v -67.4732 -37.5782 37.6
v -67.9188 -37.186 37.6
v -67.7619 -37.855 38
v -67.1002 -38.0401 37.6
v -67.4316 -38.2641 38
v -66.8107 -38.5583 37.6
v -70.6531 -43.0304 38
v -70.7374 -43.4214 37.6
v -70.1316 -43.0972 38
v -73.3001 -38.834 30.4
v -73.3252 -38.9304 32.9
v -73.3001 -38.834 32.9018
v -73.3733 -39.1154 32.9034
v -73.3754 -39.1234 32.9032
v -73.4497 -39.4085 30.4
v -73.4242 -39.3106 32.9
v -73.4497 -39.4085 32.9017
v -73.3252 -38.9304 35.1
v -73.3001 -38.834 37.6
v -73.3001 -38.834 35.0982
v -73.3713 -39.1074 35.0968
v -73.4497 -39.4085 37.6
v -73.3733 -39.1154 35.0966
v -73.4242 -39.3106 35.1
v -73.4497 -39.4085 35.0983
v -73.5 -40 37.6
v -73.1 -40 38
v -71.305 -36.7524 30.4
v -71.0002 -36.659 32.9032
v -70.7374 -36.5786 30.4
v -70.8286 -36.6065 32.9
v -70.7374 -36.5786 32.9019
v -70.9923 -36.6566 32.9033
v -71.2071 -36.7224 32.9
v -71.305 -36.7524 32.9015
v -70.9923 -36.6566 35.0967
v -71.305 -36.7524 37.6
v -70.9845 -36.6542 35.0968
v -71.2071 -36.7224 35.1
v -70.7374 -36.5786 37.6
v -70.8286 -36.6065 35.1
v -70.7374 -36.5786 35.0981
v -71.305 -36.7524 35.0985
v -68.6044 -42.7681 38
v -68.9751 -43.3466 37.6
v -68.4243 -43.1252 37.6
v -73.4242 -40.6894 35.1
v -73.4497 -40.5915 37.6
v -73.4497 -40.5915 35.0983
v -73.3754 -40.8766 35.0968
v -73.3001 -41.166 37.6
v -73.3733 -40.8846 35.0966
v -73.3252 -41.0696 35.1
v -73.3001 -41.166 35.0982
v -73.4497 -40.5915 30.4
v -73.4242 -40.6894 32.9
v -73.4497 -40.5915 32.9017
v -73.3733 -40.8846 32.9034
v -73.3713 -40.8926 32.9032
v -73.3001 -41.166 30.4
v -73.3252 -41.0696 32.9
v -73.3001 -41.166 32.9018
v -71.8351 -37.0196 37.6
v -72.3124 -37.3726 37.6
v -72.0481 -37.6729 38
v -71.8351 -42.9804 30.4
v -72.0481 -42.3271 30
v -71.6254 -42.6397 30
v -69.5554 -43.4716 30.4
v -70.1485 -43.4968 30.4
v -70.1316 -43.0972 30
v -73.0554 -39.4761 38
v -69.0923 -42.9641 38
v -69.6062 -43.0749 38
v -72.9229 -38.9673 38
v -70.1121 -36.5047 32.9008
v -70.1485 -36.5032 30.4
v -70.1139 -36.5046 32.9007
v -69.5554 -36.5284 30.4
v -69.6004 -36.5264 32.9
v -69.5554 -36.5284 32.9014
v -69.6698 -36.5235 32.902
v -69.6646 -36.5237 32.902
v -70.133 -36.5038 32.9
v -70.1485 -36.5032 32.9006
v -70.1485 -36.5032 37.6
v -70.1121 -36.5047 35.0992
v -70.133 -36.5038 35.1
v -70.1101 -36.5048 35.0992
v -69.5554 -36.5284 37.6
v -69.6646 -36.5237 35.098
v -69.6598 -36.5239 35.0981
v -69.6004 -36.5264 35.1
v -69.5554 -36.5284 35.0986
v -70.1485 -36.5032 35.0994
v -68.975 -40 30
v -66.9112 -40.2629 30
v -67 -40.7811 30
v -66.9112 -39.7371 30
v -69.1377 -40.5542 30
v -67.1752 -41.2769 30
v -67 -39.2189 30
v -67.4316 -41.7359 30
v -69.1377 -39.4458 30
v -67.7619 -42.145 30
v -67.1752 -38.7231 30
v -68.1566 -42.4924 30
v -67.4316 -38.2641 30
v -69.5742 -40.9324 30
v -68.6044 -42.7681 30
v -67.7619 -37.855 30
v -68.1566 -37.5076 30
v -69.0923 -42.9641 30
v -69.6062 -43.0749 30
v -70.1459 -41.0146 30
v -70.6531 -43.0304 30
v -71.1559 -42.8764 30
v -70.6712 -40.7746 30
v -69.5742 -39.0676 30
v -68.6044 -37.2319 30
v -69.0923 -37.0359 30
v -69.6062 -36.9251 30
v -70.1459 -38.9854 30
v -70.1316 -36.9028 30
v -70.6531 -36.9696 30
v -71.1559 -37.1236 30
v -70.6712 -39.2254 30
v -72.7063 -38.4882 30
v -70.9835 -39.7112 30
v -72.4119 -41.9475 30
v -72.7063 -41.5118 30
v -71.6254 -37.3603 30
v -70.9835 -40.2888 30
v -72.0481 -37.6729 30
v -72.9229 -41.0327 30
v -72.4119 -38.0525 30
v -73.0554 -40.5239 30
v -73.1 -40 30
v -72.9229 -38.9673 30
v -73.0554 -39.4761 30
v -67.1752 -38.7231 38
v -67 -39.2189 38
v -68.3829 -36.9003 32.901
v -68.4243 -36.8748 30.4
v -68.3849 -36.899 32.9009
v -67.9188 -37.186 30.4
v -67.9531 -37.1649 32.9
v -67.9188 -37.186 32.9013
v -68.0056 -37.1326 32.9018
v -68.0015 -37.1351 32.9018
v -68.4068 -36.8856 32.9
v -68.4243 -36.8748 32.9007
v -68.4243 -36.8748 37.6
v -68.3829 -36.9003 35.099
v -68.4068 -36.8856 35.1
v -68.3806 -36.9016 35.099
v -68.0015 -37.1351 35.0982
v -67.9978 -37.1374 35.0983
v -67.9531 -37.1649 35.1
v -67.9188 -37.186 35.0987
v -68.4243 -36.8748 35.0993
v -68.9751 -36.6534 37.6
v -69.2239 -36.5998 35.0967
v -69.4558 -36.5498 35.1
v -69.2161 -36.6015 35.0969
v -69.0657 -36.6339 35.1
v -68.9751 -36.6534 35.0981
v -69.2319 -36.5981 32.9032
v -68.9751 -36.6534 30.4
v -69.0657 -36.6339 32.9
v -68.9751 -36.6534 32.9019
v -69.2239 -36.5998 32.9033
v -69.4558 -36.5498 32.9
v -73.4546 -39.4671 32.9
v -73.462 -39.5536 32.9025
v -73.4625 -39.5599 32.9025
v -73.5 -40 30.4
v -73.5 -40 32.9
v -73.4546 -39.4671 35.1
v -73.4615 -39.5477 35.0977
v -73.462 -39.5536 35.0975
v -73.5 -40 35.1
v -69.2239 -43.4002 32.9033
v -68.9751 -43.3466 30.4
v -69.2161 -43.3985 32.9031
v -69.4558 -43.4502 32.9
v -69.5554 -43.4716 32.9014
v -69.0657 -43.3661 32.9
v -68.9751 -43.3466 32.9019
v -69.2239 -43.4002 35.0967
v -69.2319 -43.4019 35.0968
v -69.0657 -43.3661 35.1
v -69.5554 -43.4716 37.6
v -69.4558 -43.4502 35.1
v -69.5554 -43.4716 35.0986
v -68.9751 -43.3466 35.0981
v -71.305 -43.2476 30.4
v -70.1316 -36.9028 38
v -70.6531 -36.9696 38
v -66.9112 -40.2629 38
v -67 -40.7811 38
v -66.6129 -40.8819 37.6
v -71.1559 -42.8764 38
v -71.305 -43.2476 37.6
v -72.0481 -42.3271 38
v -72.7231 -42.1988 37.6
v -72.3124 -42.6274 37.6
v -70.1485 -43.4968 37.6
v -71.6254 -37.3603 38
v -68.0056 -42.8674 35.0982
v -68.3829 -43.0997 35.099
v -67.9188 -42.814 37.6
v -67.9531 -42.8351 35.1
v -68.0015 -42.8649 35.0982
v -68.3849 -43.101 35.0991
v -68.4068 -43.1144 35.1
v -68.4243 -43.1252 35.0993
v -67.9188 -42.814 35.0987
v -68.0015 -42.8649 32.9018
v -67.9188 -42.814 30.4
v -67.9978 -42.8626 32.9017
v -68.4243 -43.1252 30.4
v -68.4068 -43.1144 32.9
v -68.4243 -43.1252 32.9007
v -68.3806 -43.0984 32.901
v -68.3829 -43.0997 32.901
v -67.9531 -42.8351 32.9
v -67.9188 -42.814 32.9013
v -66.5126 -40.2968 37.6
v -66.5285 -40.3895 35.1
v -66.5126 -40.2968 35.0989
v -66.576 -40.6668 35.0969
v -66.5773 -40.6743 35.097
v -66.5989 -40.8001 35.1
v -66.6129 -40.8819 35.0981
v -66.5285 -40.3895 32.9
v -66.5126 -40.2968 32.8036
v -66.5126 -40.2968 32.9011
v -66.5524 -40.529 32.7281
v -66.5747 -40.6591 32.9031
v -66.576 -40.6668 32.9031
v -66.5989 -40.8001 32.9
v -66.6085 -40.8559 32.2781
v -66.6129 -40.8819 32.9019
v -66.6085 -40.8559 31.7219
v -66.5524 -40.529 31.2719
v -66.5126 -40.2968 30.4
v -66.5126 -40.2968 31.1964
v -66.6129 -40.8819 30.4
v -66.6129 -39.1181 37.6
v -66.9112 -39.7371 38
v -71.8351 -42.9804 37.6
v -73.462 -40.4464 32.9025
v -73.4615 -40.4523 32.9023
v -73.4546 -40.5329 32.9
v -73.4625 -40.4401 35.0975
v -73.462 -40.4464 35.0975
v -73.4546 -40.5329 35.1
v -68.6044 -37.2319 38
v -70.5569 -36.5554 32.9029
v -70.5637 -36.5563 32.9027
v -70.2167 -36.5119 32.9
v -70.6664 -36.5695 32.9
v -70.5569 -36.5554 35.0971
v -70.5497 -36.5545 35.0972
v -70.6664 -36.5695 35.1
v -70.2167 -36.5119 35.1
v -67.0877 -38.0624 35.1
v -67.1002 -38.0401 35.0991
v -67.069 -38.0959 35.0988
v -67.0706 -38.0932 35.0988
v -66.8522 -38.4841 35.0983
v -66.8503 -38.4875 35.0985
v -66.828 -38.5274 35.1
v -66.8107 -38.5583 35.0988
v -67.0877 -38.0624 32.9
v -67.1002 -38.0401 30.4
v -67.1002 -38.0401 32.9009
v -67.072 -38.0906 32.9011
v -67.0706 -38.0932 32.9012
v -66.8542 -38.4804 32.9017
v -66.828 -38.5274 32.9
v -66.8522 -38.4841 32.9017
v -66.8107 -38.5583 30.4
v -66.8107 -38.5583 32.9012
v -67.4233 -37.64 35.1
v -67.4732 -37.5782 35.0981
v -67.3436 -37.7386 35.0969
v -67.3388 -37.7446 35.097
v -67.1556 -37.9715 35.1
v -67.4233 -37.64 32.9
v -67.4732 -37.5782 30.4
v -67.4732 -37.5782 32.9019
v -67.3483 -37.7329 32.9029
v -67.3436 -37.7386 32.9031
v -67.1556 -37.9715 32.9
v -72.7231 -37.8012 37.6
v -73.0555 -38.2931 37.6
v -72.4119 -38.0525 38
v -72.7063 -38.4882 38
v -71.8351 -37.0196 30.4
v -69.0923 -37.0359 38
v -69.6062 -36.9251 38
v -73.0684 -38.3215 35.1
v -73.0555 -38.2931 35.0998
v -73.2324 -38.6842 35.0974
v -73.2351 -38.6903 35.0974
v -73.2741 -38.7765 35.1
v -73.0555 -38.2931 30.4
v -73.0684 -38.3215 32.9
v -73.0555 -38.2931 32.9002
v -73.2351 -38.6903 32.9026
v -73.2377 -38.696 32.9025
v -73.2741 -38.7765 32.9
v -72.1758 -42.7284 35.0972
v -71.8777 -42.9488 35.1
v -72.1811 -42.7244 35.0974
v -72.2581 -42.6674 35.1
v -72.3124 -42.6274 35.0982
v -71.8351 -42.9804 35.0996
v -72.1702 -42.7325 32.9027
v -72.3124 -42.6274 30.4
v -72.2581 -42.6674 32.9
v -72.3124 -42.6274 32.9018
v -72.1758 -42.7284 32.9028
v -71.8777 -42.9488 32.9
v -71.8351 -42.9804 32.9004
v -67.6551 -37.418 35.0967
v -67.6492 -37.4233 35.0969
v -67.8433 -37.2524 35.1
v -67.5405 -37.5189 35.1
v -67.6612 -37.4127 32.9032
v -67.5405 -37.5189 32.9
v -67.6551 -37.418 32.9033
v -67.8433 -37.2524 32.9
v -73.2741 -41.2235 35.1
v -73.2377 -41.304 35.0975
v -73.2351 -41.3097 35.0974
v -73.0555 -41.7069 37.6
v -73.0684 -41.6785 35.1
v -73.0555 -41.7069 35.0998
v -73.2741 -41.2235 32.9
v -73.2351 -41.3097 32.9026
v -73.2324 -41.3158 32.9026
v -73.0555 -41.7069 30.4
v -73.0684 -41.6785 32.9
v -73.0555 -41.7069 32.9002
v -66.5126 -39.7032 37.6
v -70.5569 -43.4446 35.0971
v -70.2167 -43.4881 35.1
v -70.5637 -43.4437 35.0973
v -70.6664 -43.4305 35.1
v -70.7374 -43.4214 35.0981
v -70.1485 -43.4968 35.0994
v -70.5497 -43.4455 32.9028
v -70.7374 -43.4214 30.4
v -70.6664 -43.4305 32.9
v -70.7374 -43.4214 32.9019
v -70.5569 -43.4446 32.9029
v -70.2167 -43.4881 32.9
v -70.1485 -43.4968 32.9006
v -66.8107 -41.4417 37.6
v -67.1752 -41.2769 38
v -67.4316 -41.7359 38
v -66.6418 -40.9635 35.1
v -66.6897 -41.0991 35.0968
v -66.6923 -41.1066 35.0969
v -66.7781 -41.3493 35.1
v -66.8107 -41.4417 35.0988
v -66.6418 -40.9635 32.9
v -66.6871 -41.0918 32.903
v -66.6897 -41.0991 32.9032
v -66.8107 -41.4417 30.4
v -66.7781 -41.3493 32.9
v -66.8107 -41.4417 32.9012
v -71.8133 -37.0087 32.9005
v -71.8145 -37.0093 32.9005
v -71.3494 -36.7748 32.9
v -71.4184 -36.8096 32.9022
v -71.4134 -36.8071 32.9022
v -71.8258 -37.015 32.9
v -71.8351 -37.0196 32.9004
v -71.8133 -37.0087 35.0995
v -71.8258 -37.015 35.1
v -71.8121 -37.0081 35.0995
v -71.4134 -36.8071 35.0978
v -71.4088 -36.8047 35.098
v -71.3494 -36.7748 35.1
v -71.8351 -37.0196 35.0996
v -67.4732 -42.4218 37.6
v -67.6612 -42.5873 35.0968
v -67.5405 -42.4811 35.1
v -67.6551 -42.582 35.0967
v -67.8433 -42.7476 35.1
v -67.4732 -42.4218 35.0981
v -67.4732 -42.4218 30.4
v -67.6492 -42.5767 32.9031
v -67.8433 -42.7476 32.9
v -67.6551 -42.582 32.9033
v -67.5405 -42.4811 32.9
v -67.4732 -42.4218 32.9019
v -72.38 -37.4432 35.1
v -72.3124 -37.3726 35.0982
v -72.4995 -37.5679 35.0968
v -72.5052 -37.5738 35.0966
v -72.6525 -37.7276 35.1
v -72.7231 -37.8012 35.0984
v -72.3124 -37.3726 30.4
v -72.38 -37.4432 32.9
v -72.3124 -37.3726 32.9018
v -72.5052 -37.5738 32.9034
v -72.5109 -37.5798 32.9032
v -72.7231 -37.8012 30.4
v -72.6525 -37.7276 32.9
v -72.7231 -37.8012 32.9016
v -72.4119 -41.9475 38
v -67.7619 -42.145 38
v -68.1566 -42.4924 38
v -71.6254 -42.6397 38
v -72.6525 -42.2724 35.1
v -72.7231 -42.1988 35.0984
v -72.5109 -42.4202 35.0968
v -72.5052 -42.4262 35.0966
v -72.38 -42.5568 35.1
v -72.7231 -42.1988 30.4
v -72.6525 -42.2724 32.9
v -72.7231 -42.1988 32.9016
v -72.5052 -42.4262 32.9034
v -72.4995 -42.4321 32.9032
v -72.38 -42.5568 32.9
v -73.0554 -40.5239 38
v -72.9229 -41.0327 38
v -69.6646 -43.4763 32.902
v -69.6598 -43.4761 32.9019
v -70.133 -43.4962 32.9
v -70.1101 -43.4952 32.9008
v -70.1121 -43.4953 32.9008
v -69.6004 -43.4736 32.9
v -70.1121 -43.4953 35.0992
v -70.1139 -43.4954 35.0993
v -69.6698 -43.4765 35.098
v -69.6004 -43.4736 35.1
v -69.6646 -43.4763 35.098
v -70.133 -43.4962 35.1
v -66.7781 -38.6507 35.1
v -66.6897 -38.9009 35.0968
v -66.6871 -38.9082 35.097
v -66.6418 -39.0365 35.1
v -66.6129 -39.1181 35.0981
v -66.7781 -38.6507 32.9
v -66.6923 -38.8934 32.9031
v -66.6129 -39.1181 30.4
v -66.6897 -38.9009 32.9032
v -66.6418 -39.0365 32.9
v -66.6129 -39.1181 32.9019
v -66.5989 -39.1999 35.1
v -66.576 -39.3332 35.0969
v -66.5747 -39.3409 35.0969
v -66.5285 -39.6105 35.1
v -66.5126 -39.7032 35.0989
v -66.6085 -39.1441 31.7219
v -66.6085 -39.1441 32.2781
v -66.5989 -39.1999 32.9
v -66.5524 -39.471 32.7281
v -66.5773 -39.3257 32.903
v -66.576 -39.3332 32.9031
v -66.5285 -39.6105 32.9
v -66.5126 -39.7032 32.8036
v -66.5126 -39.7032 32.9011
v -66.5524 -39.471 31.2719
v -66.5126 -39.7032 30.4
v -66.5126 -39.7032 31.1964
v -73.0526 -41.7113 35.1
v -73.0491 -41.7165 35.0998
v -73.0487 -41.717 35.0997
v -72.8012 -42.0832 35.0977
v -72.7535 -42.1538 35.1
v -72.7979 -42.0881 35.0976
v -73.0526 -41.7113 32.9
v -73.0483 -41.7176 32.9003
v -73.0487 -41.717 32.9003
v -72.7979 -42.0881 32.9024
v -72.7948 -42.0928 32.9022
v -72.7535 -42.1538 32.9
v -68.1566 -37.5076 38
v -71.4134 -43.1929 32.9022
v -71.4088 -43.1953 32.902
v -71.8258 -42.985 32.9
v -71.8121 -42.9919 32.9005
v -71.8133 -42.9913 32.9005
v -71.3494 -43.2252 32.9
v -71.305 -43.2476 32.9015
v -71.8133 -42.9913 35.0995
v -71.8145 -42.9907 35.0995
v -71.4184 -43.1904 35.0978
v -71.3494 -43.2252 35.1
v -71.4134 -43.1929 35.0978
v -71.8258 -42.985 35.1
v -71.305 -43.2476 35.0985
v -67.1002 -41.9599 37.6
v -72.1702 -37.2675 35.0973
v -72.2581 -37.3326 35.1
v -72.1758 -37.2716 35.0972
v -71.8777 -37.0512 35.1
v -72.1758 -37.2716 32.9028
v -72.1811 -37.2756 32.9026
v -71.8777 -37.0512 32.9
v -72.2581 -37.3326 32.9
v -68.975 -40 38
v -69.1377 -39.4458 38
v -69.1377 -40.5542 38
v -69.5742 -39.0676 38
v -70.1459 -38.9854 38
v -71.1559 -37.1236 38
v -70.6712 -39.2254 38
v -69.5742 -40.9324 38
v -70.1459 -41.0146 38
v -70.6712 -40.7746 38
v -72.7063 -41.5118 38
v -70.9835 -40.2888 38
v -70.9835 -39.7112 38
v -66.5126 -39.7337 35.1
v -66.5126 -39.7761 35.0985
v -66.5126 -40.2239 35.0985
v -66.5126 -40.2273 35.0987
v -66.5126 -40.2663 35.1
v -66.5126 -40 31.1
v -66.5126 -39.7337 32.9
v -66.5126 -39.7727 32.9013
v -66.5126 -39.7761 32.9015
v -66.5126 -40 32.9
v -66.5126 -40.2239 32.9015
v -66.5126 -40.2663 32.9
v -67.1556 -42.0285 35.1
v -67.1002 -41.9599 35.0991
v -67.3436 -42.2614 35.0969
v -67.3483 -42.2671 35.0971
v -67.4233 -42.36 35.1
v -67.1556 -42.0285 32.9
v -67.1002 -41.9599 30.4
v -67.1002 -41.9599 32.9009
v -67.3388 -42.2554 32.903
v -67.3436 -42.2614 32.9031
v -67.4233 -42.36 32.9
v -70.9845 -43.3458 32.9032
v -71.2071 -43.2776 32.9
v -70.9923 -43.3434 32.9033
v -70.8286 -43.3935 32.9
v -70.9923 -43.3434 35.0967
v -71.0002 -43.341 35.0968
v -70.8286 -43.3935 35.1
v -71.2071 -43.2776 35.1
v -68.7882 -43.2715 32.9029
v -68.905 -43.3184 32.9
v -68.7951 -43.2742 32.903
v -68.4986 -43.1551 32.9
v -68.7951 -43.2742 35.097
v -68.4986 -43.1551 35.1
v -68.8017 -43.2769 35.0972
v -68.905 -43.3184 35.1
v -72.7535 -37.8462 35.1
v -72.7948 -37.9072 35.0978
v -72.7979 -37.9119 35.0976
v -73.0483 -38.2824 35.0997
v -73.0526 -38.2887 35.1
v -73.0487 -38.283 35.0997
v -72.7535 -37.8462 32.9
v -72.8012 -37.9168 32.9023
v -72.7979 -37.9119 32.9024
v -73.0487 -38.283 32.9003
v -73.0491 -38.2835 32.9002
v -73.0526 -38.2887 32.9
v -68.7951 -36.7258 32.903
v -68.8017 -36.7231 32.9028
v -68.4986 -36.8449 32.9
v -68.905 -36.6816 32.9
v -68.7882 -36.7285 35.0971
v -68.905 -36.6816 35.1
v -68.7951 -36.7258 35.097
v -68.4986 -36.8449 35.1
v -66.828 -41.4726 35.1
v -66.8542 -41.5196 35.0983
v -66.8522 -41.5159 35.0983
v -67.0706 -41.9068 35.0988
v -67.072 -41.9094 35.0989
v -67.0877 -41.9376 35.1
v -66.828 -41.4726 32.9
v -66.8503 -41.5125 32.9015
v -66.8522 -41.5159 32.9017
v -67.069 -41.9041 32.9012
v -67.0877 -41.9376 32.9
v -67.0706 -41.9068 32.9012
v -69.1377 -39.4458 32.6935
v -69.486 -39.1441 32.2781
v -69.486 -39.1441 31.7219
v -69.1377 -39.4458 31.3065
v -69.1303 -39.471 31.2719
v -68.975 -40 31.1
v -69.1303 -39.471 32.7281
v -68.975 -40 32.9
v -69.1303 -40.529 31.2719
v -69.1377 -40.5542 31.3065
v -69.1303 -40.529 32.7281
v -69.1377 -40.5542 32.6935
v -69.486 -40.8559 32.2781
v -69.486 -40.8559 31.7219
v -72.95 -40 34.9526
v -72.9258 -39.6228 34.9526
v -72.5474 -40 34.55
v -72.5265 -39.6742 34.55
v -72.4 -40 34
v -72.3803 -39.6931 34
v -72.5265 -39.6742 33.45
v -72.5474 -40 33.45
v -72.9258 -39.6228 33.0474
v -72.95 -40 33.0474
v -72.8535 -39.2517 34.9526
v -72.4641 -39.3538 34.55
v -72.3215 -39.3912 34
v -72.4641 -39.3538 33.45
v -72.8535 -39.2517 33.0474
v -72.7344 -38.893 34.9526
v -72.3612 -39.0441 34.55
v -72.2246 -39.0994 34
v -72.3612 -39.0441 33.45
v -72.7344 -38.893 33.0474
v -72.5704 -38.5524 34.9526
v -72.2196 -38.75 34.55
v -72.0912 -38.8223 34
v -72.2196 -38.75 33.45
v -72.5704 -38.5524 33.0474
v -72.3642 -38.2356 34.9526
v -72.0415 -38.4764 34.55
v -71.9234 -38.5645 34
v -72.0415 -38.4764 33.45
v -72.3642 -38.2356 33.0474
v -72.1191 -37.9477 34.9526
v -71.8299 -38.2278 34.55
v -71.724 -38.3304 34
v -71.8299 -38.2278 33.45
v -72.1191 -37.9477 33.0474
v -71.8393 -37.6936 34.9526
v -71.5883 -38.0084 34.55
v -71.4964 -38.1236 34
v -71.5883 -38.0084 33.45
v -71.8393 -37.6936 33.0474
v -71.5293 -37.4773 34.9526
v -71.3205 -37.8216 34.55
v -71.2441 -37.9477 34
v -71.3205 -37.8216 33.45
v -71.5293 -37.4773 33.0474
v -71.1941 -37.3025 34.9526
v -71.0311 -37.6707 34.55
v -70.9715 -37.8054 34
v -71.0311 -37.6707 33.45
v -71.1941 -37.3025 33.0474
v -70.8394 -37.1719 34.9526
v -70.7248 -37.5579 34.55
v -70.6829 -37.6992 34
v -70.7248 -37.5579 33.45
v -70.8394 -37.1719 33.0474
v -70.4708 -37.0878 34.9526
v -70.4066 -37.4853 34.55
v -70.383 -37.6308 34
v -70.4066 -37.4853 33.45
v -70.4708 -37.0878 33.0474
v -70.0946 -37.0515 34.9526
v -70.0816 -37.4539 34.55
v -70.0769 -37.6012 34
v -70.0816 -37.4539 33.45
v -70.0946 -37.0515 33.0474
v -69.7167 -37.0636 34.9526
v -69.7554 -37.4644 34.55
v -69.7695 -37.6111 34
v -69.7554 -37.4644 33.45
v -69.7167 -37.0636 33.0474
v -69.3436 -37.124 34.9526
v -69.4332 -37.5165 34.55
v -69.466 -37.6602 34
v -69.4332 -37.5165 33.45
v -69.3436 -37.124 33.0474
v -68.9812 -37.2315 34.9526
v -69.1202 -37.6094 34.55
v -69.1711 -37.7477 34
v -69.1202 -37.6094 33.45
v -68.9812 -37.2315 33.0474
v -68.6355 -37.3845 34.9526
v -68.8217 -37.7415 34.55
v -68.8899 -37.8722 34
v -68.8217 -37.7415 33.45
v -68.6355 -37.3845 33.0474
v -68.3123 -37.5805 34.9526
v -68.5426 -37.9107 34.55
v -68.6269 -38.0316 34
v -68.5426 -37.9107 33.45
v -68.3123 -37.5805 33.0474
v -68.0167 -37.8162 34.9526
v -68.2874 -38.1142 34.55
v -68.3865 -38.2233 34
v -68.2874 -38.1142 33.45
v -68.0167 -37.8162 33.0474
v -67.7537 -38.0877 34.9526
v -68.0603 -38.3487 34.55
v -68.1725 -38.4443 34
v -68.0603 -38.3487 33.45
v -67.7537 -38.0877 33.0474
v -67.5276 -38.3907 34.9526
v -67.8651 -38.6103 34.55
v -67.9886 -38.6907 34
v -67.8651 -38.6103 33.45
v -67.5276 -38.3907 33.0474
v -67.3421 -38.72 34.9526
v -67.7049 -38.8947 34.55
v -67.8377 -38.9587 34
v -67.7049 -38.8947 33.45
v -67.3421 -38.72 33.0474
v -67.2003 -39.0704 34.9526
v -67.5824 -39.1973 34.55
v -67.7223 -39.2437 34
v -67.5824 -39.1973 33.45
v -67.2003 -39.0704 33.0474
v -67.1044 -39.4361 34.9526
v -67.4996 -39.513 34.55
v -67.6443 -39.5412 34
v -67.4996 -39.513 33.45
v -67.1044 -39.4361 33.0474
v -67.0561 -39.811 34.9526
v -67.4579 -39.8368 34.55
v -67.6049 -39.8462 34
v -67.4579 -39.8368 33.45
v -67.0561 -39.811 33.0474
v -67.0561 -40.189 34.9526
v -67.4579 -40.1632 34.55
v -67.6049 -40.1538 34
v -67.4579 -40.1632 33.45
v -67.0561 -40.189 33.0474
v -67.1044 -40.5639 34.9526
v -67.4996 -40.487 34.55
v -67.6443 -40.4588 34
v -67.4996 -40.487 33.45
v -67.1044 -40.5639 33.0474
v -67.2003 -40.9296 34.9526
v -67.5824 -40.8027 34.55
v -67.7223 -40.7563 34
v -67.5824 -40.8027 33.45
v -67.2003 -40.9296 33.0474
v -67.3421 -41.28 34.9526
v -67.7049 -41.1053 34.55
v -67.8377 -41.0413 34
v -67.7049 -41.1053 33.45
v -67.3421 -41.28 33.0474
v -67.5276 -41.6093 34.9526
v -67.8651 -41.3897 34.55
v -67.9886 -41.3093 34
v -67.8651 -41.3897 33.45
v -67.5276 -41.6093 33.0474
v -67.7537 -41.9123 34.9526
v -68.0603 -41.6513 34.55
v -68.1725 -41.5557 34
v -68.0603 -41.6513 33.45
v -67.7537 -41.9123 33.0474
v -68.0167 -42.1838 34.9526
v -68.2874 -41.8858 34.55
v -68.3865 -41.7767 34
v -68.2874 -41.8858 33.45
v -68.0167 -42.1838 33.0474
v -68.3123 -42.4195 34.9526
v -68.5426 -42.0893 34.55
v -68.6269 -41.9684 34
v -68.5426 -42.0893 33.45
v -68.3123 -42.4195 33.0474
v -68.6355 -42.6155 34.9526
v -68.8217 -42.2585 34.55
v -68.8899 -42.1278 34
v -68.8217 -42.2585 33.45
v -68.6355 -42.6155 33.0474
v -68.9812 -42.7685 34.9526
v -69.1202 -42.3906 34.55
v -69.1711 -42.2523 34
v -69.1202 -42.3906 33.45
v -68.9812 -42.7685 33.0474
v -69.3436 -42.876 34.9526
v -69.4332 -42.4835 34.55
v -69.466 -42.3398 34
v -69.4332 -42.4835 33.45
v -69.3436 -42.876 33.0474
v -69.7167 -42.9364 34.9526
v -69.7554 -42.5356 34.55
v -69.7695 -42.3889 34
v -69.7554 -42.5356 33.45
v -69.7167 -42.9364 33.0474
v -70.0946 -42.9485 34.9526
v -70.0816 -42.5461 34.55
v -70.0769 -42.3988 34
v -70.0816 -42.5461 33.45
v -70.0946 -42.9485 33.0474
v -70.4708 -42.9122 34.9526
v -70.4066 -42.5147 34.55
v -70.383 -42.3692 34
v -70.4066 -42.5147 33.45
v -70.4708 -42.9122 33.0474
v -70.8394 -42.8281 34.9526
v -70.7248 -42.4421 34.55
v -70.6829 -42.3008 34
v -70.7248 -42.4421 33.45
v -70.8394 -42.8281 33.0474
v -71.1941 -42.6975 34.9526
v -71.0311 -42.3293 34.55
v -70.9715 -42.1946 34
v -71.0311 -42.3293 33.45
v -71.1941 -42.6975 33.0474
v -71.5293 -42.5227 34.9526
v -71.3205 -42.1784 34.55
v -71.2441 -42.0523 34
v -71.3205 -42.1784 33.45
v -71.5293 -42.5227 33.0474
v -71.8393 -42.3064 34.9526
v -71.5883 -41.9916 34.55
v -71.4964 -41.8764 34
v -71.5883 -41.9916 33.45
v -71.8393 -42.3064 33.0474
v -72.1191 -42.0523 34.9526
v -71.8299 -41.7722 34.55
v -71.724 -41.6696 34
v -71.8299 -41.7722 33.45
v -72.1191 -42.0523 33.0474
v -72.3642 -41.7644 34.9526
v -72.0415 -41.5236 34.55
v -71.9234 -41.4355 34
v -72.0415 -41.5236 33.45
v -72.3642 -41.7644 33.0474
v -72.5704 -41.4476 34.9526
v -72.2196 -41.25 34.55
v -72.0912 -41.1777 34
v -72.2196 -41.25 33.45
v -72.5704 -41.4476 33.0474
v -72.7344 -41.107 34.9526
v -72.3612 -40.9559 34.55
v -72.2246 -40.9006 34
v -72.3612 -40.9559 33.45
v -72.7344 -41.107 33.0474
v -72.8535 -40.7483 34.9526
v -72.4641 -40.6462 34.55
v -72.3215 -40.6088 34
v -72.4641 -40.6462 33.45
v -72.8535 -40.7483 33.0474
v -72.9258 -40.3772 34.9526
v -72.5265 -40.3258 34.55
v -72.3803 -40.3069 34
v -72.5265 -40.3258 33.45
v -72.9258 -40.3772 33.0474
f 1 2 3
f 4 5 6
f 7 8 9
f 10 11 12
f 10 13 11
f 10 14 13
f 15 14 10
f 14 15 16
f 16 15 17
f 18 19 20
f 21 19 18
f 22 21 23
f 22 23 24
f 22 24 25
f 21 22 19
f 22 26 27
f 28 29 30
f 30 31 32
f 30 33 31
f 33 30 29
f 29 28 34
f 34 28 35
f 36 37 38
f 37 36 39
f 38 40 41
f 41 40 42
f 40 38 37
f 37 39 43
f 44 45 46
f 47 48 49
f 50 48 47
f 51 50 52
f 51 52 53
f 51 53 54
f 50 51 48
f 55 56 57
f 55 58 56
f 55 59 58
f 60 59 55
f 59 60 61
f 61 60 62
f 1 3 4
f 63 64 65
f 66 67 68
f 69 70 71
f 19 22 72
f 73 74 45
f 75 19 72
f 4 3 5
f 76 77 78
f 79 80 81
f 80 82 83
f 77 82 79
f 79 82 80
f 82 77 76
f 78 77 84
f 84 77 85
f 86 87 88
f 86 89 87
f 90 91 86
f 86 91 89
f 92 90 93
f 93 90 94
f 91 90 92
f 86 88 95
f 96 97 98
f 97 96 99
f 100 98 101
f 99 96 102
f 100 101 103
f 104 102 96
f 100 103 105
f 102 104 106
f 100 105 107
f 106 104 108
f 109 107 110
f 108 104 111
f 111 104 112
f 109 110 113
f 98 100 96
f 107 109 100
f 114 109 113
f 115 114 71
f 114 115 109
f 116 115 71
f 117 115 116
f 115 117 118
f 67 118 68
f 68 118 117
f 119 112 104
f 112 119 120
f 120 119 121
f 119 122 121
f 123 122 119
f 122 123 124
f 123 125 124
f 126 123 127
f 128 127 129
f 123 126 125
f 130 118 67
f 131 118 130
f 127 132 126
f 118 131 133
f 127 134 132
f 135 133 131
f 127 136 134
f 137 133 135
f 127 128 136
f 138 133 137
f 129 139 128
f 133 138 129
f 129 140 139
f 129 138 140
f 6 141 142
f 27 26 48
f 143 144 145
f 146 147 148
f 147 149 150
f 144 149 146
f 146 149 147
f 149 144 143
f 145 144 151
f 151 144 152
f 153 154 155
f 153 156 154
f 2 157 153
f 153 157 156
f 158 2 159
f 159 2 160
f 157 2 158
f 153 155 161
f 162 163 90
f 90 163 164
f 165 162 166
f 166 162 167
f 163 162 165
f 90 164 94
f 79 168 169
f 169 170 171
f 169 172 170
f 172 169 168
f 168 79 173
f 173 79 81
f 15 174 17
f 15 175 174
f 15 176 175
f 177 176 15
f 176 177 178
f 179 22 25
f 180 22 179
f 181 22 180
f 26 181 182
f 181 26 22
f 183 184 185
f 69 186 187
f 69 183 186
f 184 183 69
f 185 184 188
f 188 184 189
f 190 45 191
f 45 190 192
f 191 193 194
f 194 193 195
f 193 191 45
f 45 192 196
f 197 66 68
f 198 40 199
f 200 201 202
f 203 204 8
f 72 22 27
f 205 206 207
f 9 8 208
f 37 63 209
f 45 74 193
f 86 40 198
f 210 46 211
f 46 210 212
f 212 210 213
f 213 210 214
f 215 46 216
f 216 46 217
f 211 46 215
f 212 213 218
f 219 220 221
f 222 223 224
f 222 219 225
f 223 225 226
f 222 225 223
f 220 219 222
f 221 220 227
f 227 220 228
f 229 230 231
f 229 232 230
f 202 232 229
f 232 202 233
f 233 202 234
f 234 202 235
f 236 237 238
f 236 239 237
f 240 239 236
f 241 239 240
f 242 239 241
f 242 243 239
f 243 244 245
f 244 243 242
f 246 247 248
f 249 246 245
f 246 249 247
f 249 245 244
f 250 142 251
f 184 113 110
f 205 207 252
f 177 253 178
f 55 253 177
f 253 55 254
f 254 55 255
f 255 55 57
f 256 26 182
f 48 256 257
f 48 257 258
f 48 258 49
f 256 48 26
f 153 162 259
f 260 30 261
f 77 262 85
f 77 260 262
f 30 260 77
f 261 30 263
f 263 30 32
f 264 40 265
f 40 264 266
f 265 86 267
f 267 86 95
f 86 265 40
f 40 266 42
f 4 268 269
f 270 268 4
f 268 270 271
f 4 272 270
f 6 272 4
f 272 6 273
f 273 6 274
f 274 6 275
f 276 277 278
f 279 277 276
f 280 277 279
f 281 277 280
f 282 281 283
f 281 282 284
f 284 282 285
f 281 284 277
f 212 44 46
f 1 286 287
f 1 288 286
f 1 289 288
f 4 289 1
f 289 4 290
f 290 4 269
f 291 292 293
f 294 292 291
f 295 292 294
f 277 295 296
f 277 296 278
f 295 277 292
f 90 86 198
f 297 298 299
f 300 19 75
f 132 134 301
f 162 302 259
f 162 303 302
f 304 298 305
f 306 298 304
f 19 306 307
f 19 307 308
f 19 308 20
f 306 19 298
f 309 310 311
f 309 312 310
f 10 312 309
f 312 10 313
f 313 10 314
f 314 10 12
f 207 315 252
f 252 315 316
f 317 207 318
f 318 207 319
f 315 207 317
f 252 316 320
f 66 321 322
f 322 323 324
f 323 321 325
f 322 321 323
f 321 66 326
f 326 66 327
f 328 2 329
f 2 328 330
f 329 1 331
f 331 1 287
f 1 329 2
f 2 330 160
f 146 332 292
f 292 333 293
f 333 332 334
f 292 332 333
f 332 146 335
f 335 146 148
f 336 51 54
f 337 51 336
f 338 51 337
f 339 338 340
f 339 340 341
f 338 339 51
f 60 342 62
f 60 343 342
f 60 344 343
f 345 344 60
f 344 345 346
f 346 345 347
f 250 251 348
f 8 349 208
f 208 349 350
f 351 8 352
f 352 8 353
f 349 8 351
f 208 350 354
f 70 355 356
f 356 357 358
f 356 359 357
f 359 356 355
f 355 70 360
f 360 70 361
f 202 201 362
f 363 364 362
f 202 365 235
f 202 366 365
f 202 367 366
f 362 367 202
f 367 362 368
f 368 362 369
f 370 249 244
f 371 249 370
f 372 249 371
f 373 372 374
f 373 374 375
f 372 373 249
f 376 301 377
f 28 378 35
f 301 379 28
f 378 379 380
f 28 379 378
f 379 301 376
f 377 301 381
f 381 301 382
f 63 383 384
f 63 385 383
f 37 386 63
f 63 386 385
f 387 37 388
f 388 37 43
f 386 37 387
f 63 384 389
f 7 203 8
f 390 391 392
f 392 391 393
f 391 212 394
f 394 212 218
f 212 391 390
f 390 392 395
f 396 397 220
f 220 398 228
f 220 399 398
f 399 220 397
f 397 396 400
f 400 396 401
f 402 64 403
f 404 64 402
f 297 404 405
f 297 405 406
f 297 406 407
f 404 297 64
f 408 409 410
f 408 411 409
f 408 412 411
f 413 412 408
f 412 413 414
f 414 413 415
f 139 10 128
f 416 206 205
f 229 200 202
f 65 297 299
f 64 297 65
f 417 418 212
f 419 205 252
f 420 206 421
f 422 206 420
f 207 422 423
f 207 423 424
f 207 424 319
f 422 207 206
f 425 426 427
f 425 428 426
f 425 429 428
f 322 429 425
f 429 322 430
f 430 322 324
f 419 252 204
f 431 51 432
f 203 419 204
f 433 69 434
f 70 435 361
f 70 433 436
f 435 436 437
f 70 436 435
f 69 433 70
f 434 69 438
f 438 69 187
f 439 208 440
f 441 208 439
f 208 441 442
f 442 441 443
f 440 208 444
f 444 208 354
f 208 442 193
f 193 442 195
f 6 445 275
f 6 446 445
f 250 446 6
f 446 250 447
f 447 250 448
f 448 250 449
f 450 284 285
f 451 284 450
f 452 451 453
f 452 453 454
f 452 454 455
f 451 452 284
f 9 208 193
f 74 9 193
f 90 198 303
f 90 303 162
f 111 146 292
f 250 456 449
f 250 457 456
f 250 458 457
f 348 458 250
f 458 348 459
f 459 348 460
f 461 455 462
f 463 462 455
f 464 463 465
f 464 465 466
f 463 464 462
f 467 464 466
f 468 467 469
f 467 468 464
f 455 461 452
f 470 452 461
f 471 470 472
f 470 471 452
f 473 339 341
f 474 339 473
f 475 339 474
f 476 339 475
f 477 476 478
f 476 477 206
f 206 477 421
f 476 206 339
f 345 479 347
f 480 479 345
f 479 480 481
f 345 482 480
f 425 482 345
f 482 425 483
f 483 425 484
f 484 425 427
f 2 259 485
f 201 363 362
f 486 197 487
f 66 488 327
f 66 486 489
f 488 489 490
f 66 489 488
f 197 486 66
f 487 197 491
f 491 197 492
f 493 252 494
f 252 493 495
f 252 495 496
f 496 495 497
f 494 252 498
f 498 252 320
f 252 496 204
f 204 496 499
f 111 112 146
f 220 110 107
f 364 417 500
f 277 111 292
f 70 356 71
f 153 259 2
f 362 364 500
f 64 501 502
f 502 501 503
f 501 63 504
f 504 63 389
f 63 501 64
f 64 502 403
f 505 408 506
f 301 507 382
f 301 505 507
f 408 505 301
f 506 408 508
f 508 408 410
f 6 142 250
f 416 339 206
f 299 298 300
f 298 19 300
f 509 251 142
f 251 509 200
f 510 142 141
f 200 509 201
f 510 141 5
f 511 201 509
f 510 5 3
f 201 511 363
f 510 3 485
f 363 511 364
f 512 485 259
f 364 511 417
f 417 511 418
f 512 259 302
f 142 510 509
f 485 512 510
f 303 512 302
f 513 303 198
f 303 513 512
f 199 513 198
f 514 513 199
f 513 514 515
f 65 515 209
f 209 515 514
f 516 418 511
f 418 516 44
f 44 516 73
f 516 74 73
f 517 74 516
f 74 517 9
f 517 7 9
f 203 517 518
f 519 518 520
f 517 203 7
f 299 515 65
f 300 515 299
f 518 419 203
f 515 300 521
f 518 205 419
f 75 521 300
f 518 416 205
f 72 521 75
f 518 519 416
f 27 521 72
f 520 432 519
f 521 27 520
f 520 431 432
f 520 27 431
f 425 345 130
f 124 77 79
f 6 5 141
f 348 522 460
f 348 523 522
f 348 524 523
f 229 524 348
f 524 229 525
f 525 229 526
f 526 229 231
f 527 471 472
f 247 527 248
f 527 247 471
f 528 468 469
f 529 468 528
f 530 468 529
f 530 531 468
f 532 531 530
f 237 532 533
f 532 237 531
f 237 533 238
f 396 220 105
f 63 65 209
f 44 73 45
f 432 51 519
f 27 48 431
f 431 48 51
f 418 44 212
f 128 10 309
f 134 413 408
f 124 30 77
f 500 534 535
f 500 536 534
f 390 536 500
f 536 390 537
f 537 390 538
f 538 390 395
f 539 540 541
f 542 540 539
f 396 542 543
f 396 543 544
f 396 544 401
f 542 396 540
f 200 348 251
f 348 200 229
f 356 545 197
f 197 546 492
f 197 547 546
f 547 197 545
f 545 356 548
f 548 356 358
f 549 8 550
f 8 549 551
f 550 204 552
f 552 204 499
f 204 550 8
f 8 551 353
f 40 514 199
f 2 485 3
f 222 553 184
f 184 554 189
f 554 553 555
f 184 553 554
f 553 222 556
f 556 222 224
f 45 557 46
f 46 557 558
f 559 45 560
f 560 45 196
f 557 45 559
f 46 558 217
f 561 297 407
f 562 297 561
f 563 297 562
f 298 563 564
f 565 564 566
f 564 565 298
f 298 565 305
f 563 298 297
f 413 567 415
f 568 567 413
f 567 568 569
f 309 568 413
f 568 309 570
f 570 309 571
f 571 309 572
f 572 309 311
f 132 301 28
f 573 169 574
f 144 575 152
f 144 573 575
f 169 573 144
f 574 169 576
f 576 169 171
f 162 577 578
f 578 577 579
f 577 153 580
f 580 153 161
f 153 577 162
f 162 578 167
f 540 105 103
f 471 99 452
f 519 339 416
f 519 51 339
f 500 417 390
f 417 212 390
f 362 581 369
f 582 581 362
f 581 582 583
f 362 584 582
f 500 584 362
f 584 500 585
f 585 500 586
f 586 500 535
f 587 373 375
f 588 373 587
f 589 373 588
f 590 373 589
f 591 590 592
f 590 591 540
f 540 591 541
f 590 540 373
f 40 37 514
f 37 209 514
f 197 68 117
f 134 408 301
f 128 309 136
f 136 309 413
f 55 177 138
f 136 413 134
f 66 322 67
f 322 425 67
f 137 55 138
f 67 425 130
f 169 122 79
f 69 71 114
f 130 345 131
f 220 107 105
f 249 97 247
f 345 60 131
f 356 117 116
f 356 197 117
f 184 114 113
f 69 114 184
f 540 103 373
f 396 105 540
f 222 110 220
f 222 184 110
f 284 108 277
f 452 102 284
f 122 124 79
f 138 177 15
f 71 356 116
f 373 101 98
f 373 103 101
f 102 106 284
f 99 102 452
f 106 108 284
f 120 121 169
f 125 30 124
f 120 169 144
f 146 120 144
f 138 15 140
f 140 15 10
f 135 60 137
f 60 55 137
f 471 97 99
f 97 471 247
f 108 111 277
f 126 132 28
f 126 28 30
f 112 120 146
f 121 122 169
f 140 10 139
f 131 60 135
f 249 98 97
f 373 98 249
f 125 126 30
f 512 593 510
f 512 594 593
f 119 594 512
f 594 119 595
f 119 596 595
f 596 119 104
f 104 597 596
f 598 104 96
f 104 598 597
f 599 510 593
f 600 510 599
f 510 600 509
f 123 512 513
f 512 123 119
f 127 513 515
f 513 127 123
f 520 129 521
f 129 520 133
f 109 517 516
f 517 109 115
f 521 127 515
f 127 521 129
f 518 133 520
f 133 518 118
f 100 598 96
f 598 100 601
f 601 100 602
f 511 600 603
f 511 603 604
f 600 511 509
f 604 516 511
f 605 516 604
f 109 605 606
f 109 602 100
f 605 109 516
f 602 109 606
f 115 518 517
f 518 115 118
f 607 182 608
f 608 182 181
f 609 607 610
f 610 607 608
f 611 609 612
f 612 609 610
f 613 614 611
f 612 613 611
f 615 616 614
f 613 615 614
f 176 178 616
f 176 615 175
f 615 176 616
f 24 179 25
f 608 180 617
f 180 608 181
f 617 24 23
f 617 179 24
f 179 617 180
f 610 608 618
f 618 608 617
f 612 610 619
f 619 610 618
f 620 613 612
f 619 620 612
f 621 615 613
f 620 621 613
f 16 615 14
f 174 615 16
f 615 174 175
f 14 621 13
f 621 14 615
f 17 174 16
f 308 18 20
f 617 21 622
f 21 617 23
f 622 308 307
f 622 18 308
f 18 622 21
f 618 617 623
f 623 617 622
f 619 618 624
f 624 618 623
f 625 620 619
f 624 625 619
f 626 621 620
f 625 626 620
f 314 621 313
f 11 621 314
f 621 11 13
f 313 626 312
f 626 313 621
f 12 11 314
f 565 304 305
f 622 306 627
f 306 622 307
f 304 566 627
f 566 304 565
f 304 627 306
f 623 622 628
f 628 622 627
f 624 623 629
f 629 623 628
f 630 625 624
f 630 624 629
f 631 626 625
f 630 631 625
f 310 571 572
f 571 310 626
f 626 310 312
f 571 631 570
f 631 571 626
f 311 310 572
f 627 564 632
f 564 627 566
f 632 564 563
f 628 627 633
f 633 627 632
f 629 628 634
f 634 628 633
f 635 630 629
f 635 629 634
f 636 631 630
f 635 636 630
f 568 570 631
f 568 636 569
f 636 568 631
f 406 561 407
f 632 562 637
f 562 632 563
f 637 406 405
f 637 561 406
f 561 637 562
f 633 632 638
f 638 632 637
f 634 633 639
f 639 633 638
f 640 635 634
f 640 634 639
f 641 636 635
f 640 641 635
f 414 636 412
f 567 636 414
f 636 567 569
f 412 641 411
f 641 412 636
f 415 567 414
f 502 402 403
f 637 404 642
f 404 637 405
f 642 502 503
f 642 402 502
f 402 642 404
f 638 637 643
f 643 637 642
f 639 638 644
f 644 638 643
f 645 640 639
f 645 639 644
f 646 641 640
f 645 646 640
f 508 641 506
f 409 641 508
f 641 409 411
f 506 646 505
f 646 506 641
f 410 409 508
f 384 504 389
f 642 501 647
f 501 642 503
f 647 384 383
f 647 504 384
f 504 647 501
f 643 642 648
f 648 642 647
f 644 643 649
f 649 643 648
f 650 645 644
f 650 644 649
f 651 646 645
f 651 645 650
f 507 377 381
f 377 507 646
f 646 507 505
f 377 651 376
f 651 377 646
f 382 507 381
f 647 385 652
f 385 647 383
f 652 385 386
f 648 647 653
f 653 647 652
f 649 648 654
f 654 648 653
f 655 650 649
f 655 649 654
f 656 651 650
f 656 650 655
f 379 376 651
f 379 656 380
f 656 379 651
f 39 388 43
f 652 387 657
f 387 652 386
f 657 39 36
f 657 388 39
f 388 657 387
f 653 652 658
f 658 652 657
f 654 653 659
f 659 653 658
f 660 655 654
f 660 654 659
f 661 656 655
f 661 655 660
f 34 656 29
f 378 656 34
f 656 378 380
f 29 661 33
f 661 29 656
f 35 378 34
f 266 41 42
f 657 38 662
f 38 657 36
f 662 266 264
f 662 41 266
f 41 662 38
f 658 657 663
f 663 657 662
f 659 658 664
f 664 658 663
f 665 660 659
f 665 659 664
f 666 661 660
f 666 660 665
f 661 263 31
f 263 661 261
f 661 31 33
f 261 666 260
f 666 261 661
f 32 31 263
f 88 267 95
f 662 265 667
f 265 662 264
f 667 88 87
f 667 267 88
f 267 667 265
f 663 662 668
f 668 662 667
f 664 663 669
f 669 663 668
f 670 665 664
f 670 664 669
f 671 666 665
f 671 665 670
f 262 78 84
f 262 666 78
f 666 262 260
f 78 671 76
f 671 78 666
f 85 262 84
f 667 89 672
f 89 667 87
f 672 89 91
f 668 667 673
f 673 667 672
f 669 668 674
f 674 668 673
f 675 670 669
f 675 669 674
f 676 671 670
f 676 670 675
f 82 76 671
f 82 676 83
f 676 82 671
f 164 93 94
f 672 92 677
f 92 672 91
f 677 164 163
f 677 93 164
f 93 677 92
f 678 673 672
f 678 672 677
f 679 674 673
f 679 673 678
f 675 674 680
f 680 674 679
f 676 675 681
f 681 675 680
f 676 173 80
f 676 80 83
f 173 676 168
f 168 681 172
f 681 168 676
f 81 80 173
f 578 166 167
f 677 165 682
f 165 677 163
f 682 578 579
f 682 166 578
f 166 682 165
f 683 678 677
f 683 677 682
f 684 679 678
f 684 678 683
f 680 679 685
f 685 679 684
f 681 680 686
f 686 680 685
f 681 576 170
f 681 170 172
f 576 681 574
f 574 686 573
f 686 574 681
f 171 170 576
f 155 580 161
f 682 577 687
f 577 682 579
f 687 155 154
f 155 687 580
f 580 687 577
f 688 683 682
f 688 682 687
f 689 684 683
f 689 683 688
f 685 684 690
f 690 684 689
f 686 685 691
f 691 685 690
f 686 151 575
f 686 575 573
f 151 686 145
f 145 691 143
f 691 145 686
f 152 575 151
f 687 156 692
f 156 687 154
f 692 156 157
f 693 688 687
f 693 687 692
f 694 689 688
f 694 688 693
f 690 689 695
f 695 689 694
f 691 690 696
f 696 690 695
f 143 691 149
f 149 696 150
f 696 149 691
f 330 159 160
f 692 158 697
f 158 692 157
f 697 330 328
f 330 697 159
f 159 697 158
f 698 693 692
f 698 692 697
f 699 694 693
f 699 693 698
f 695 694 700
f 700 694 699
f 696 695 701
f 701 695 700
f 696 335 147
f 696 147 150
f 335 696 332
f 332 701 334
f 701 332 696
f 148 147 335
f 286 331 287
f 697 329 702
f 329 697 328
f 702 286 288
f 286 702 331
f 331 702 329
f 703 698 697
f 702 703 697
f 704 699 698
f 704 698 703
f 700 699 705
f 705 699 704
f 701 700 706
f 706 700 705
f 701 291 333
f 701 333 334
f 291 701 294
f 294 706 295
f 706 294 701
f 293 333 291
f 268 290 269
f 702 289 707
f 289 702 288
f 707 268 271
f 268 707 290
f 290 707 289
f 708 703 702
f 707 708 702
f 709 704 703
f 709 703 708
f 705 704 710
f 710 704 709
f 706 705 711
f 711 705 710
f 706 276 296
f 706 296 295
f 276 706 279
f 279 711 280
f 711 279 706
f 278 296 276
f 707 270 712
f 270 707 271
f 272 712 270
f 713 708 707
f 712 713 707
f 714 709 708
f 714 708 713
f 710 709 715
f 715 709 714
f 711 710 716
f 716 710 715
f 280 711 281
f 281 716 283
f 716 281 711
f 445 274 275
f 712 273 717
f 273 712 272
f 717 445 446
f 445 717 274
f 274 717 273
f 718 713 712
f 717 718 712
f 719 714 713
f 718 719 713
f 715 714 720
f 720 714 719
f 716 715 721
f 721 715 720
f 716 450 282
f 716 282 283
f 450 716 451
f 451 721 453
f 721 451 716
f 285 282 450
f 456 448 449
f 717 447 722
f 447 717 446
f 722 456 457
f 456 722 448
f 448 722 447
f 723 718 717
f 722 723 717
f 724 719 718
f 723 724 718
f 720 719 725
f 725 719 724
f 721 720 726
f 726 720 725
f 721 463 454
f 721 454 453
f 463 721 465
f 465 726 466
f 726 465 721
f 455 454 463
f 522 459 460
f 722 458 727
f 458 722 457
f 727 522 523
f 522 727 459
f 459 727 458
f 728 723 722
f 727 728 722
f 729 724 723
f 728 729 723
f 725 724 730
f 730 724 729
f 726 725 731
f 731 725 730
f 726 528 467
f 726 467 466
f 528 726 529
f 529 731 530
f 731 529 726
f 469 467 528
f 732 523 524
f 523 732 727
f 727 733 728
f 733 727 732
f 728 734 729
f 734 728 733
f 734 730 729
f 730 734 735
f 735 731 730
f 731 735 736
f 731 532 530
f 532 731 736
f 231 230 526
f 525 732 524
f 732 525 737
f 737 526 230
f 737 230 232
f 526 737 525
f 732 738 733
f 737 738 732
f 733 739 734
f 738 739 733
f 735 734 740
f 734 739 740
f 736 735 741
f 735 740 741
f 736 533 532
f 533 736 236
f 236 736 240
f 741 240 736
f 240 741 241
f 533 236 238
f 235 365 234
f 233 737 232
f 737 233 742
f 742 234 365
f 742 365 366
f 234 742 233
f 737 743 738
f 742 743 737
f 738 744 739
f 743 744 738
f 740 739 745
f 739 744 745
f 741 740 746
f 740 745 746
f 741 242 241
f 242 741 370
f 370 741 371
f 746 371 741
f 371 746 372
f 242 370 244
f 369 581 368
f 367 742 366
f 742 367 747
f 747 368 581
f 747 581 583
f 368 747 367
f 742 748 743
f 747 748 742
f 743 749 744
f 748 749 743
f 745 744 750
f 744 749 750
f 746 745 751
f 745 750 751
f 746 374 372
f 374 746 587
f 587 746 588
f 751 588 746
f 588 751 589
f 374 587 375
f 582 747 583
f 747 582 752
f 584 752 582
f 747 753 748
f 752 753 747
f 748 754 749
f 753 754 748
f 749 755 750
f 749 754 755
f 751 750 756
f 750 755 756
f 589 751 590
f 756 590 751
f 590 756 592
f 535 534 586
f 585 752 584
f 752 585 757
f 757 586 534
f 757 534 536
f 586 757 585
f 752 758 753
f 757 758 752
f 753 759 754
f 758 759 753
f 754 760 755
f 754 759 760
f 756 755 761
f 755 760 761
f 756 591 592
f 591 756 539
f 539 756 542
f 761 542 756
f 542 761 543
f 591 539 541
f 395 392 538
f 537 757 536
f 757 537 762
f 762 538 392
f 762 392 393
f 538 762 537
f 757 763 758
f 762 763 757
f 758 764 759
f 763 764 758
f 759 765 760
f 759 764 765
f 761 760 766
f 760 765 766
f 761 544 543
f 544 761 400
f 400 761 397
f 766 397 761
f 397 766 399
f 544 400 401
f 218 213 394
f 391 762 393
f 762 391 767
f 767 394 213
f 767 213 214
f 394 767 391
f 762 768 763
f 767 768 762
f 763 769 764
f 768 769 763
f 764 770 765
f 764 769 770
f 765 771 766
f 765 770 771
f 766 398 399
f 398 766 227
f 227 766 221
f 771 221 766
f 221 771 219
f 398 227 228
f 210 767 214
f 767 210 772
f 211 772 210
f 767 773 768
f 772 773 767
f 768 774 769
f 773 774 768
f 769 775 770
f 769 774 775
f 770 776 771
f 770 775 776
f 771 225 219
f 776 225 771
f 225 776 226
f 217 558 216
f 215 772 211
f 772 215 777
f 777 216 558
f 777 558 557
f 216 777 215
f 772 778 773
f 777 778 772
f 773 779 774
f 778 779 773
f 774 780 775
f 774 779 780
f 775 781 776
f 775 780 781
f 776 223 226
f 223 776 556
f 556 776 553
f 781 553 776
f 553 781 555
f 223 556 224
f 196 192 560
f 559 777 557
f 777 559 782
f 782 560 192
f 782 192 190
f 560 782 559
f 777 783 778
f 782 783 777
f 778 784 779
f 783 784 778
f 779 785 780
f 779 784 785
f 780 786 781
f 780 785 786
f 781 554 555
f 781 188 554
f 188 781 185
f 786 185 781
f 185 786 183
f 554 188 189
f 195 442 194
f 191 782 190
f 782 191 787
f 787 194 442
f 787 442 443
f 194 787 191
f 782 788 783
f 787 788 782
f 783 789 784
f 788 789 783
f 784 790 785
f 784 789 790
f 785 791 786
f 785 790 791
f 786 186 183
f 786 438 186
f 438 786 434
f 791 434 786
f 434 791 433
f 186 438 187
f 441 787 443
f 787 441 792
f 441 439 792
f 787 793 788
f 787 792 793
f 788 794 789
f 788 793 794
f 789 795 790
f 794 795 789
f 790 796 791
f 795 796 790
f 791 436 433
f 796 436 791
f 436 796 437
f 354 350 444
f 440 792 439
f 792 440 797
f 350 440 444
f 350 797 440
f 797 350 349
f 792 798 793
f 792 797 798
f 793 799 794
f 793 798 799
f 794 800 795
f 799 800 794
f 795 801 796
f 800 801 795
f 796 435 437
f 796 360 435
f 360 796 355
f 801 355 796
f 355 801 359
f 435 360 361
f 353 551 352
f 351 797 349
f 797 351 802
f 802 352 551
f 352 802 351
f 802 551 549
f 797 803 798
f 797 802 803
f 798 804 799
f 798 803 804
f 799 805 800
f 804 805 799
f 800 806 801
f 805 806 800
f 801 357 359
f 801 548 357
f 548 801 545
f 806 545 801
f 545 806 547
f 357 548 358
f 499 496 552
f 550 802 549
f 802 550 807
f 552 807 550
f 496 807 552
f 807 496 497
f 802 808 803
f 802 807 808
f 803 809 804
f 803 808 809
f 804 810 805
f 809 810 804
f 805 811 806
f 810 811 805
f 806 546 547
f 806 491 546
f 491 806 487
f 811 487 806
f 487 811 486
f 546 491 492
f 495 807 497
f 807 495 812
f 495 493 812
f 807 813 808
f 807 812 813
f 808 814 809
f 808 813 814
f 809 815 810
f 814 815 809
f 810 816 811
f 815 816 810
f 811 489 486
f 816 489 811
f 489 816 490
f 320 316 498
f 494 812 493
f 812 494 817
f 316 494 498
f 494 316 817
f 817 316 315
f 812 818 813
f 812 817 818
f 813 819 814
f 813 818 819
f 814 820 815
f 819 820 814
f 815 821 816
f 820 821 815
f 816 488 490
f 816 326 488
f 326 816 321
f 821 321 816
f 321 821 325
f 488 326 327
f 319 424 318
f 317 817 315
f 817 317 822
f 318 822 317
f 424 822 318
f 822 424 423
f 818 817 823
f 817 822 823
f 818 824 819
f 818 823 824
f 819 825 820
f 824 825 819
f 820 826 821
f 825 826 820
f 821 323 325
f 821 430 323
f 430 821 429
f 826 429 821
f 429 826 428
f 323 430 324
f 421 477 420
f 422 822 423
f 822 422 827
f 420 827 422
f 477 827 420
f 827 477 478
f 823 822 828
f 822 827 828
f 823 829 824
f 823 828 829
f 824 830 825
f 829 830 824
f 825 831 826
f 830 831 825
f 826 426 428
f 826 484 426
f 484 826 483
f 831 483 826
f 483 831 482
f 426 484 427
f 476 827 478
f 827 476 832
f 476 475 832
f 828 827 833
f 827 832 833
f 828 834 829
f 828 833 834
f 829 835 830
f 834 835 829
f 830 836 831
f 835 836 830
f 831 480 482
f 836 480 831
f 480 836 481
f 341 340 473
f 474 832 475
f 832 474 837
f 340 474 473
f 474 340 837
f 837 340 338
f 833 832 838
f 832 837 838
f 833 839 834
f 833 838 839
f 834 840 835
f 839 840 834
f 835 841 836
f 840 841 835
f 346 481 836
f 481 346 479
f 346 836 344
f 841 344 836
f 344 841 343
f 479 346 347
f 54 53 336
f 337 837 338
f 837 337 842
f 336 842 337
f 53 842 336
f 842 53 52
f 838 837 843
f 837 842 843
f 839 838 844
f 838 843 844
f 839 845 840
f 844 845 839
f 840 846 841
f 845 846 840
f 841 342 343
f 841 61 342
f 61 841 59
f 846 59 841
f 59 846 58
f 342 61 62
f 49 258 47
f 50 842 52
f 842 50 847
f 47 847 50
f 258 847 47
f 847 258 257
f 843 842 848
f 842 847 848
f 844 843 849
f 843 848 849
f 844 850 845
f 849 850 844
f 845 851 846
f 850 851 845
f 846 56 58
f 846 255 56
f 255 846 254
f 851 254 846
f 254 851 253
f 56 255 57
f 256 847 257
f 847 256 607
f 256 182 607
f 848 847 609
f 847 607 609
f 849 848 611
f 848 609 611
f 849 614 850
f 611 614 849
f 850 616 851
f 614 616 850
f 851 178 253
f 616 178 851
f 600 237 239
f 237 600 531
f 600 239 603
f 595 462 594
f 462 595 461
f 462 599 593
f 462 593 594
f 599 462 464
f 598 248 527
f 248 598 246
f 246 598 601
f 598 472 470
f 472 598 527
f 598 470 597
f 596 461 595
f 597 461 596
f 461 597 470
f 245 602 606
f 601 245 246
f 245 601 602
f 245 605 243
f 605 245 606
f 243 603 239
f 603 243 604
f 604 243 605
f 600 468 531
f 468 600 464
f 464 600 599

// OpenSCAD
// file: ../lib/common.scad
// ============================================================================
//  Вспомогательные модули общего назначения.
//  Подключать через use <lib/common.scad> — файл не содержит параметров
//  проекта и ни от чего не зависит.
// ============================================================================

_eps = 0.01;

// --------------------------------------------------------------------- 2D ---
// Прямоугольник со скруглёнными углами, по центру
module rrect(w, d, r) {
    rr = min(r, w/2 - _eps, d/2 - _eps);
    if (rr > 0) offset(r = rr) square([w - 2*rr, d - 2*rr], center = true);
    else square([w, d], center = true);
}

// --------------------------------------------------------------------- 3D ---
// Коробка со скруглением ТОЛЬКО вертикальных рёбер: нижние и верхние острые
module rounded_box(w, d, h, r) linear_extrude(height = h) rrect(w, d, r);

// Цилиндр с фасками на торцах (снимает «слоновью ногу» и облегчает посадку)
module chamfered_cyl(d, h, ch = 0.6, bottom = true, top = true) {
    r  = d/2;
    cb = bottom ? min(ch, h/2) : 0;
    ct = top    ? min(ch, h/2) : 0;
    if (cb <= 0 && ct <= 0) cylinder(d = d, h = h);
    else rotate_extrude(angle = 360) polygon(concat(
        [[0, 0]],
        cb > 0 ? [[r - cb, 0], [r, cb]] : [[r, 0]],
        ct > 0 ? [[r, h - ct], [r - ct, h]] : [[r, h]],
        [[0, h]]));
}

// Труба
module tube(od, id, h) difference() {
    cylinder(d = od, h = h);
    translate([0, 0, -_eps]) cylinder(d = id, h = h + 2*_eps);
}

// Сквозное отверстие, растянутое вверх-вниз для гарантированного вычитания
module thru(d, h) translate([0, 0, -_eps]) cylinder(d = d, h = h + 2*_eps);

// Потайное отверстие под саморез с конической головкой.
// Пластина занимает z = [0 .. t], головка утапливается сверху,
// саморез идёт вниз (в ответную стойку).
module countersunk_hole(free_d, head_d, t, down = 30) {
    cone_h = (head_d - free_d)/2;    // головка 90 градусов
    union() {
        translate([0, 0, -down]) cylinder(d = free_d, h = down + t - cone_h + _eps);
        translate([0, 0, t - cone_h]) cylinder(d1 = free_d, d2 = head_d, h = cone_h);
    }
}

// Паз (щелевое отверстие) длиной len по X, сквозной по высоте h
module slot(len, d, h) hull() for (s = [-1, 1])
    translate([s*(len - d)/2, 0, 0]) cylinder(d = d, h = h);

// Стойка под саморез: цилиндр с пилотным отверстием сверху.
// Снизу фаски нет — стойка растёт из дна детали.
module screw_boss(od, h, pilot_d, pilot_depth, ch = 0.6) difference() {
    chamfered_cyl(od, h, ch = ch, bottom = false, top = true);
    translate([0, 0, h - pilot_depth]) cylinder(d = pilot_d, h = pilot_depth + _eps);
}

// Треугольная косынка в плоскости XZ (катеты l по X и h по Z), толщина t по Y
module gusset(l, h, t) translate([0, -t/2, 0]) linear_extrude(height = t)
    polygon([[0, 0], [l, 0], [0, h]]);

// Конусное гнездо под заточенный винт-ось (ось Z вниз от z=0)
module cone_seat(d, depth) translate([0, 0, -depth])
    cylinder(d1 = 0.2, d2 = d, h = depth + _eps);

// Канавка под круглый пассик: тор, вычитаемый из обода
module belt_groove(pulley_d, groove_r) rotate_extrude(angle = 360)
    translate([pulley_d/2, 0]) circle(r = groove_r);

// Сетка облегчающих отверстий по кругу
module radial_holes(n, r, d, h) for (i = [0 : n - 1])
    rotate([0, 0, i*360/n]) translate([r, 0, 0]) thru(d, h);
// main file
// ============================================================================
//  ВЕДУЩИЙ ШКИВ (на валу двигателя)
//
//  ВНИМАНИЕ: двигатель ещё не выбран, поэтому диаметр вала
//  (motor_shaft_d) и передаточное отношение — предварительные.
//  Печать: стоя, 100% заполнение. Посадка на вал — с натягом + фиксатор.
// ============================================================================

include <../params.scad>
use <../lib/common.scad>

module motor_pulley() {
    translate([motor_pos[0], motor_pos[1], pulley_z]) difference() {
        chamfered_cyl(motor_pulley_d, pulley_h, ch = 0.4);
        thru(motor_shaft_d + 0.05, pulley_h);
        translate([0, 0, pulley_h/2]) belt_groove(motor_pulley_d, belt_groove_r);
        // радиальный винт М2 для фиксации на валу
        translate([0, 0, 2]) rotate([0, 90, 0])
            cylinder(d = 1.8, h = motor_pulley_d);
    }
}

motor_pulley();
